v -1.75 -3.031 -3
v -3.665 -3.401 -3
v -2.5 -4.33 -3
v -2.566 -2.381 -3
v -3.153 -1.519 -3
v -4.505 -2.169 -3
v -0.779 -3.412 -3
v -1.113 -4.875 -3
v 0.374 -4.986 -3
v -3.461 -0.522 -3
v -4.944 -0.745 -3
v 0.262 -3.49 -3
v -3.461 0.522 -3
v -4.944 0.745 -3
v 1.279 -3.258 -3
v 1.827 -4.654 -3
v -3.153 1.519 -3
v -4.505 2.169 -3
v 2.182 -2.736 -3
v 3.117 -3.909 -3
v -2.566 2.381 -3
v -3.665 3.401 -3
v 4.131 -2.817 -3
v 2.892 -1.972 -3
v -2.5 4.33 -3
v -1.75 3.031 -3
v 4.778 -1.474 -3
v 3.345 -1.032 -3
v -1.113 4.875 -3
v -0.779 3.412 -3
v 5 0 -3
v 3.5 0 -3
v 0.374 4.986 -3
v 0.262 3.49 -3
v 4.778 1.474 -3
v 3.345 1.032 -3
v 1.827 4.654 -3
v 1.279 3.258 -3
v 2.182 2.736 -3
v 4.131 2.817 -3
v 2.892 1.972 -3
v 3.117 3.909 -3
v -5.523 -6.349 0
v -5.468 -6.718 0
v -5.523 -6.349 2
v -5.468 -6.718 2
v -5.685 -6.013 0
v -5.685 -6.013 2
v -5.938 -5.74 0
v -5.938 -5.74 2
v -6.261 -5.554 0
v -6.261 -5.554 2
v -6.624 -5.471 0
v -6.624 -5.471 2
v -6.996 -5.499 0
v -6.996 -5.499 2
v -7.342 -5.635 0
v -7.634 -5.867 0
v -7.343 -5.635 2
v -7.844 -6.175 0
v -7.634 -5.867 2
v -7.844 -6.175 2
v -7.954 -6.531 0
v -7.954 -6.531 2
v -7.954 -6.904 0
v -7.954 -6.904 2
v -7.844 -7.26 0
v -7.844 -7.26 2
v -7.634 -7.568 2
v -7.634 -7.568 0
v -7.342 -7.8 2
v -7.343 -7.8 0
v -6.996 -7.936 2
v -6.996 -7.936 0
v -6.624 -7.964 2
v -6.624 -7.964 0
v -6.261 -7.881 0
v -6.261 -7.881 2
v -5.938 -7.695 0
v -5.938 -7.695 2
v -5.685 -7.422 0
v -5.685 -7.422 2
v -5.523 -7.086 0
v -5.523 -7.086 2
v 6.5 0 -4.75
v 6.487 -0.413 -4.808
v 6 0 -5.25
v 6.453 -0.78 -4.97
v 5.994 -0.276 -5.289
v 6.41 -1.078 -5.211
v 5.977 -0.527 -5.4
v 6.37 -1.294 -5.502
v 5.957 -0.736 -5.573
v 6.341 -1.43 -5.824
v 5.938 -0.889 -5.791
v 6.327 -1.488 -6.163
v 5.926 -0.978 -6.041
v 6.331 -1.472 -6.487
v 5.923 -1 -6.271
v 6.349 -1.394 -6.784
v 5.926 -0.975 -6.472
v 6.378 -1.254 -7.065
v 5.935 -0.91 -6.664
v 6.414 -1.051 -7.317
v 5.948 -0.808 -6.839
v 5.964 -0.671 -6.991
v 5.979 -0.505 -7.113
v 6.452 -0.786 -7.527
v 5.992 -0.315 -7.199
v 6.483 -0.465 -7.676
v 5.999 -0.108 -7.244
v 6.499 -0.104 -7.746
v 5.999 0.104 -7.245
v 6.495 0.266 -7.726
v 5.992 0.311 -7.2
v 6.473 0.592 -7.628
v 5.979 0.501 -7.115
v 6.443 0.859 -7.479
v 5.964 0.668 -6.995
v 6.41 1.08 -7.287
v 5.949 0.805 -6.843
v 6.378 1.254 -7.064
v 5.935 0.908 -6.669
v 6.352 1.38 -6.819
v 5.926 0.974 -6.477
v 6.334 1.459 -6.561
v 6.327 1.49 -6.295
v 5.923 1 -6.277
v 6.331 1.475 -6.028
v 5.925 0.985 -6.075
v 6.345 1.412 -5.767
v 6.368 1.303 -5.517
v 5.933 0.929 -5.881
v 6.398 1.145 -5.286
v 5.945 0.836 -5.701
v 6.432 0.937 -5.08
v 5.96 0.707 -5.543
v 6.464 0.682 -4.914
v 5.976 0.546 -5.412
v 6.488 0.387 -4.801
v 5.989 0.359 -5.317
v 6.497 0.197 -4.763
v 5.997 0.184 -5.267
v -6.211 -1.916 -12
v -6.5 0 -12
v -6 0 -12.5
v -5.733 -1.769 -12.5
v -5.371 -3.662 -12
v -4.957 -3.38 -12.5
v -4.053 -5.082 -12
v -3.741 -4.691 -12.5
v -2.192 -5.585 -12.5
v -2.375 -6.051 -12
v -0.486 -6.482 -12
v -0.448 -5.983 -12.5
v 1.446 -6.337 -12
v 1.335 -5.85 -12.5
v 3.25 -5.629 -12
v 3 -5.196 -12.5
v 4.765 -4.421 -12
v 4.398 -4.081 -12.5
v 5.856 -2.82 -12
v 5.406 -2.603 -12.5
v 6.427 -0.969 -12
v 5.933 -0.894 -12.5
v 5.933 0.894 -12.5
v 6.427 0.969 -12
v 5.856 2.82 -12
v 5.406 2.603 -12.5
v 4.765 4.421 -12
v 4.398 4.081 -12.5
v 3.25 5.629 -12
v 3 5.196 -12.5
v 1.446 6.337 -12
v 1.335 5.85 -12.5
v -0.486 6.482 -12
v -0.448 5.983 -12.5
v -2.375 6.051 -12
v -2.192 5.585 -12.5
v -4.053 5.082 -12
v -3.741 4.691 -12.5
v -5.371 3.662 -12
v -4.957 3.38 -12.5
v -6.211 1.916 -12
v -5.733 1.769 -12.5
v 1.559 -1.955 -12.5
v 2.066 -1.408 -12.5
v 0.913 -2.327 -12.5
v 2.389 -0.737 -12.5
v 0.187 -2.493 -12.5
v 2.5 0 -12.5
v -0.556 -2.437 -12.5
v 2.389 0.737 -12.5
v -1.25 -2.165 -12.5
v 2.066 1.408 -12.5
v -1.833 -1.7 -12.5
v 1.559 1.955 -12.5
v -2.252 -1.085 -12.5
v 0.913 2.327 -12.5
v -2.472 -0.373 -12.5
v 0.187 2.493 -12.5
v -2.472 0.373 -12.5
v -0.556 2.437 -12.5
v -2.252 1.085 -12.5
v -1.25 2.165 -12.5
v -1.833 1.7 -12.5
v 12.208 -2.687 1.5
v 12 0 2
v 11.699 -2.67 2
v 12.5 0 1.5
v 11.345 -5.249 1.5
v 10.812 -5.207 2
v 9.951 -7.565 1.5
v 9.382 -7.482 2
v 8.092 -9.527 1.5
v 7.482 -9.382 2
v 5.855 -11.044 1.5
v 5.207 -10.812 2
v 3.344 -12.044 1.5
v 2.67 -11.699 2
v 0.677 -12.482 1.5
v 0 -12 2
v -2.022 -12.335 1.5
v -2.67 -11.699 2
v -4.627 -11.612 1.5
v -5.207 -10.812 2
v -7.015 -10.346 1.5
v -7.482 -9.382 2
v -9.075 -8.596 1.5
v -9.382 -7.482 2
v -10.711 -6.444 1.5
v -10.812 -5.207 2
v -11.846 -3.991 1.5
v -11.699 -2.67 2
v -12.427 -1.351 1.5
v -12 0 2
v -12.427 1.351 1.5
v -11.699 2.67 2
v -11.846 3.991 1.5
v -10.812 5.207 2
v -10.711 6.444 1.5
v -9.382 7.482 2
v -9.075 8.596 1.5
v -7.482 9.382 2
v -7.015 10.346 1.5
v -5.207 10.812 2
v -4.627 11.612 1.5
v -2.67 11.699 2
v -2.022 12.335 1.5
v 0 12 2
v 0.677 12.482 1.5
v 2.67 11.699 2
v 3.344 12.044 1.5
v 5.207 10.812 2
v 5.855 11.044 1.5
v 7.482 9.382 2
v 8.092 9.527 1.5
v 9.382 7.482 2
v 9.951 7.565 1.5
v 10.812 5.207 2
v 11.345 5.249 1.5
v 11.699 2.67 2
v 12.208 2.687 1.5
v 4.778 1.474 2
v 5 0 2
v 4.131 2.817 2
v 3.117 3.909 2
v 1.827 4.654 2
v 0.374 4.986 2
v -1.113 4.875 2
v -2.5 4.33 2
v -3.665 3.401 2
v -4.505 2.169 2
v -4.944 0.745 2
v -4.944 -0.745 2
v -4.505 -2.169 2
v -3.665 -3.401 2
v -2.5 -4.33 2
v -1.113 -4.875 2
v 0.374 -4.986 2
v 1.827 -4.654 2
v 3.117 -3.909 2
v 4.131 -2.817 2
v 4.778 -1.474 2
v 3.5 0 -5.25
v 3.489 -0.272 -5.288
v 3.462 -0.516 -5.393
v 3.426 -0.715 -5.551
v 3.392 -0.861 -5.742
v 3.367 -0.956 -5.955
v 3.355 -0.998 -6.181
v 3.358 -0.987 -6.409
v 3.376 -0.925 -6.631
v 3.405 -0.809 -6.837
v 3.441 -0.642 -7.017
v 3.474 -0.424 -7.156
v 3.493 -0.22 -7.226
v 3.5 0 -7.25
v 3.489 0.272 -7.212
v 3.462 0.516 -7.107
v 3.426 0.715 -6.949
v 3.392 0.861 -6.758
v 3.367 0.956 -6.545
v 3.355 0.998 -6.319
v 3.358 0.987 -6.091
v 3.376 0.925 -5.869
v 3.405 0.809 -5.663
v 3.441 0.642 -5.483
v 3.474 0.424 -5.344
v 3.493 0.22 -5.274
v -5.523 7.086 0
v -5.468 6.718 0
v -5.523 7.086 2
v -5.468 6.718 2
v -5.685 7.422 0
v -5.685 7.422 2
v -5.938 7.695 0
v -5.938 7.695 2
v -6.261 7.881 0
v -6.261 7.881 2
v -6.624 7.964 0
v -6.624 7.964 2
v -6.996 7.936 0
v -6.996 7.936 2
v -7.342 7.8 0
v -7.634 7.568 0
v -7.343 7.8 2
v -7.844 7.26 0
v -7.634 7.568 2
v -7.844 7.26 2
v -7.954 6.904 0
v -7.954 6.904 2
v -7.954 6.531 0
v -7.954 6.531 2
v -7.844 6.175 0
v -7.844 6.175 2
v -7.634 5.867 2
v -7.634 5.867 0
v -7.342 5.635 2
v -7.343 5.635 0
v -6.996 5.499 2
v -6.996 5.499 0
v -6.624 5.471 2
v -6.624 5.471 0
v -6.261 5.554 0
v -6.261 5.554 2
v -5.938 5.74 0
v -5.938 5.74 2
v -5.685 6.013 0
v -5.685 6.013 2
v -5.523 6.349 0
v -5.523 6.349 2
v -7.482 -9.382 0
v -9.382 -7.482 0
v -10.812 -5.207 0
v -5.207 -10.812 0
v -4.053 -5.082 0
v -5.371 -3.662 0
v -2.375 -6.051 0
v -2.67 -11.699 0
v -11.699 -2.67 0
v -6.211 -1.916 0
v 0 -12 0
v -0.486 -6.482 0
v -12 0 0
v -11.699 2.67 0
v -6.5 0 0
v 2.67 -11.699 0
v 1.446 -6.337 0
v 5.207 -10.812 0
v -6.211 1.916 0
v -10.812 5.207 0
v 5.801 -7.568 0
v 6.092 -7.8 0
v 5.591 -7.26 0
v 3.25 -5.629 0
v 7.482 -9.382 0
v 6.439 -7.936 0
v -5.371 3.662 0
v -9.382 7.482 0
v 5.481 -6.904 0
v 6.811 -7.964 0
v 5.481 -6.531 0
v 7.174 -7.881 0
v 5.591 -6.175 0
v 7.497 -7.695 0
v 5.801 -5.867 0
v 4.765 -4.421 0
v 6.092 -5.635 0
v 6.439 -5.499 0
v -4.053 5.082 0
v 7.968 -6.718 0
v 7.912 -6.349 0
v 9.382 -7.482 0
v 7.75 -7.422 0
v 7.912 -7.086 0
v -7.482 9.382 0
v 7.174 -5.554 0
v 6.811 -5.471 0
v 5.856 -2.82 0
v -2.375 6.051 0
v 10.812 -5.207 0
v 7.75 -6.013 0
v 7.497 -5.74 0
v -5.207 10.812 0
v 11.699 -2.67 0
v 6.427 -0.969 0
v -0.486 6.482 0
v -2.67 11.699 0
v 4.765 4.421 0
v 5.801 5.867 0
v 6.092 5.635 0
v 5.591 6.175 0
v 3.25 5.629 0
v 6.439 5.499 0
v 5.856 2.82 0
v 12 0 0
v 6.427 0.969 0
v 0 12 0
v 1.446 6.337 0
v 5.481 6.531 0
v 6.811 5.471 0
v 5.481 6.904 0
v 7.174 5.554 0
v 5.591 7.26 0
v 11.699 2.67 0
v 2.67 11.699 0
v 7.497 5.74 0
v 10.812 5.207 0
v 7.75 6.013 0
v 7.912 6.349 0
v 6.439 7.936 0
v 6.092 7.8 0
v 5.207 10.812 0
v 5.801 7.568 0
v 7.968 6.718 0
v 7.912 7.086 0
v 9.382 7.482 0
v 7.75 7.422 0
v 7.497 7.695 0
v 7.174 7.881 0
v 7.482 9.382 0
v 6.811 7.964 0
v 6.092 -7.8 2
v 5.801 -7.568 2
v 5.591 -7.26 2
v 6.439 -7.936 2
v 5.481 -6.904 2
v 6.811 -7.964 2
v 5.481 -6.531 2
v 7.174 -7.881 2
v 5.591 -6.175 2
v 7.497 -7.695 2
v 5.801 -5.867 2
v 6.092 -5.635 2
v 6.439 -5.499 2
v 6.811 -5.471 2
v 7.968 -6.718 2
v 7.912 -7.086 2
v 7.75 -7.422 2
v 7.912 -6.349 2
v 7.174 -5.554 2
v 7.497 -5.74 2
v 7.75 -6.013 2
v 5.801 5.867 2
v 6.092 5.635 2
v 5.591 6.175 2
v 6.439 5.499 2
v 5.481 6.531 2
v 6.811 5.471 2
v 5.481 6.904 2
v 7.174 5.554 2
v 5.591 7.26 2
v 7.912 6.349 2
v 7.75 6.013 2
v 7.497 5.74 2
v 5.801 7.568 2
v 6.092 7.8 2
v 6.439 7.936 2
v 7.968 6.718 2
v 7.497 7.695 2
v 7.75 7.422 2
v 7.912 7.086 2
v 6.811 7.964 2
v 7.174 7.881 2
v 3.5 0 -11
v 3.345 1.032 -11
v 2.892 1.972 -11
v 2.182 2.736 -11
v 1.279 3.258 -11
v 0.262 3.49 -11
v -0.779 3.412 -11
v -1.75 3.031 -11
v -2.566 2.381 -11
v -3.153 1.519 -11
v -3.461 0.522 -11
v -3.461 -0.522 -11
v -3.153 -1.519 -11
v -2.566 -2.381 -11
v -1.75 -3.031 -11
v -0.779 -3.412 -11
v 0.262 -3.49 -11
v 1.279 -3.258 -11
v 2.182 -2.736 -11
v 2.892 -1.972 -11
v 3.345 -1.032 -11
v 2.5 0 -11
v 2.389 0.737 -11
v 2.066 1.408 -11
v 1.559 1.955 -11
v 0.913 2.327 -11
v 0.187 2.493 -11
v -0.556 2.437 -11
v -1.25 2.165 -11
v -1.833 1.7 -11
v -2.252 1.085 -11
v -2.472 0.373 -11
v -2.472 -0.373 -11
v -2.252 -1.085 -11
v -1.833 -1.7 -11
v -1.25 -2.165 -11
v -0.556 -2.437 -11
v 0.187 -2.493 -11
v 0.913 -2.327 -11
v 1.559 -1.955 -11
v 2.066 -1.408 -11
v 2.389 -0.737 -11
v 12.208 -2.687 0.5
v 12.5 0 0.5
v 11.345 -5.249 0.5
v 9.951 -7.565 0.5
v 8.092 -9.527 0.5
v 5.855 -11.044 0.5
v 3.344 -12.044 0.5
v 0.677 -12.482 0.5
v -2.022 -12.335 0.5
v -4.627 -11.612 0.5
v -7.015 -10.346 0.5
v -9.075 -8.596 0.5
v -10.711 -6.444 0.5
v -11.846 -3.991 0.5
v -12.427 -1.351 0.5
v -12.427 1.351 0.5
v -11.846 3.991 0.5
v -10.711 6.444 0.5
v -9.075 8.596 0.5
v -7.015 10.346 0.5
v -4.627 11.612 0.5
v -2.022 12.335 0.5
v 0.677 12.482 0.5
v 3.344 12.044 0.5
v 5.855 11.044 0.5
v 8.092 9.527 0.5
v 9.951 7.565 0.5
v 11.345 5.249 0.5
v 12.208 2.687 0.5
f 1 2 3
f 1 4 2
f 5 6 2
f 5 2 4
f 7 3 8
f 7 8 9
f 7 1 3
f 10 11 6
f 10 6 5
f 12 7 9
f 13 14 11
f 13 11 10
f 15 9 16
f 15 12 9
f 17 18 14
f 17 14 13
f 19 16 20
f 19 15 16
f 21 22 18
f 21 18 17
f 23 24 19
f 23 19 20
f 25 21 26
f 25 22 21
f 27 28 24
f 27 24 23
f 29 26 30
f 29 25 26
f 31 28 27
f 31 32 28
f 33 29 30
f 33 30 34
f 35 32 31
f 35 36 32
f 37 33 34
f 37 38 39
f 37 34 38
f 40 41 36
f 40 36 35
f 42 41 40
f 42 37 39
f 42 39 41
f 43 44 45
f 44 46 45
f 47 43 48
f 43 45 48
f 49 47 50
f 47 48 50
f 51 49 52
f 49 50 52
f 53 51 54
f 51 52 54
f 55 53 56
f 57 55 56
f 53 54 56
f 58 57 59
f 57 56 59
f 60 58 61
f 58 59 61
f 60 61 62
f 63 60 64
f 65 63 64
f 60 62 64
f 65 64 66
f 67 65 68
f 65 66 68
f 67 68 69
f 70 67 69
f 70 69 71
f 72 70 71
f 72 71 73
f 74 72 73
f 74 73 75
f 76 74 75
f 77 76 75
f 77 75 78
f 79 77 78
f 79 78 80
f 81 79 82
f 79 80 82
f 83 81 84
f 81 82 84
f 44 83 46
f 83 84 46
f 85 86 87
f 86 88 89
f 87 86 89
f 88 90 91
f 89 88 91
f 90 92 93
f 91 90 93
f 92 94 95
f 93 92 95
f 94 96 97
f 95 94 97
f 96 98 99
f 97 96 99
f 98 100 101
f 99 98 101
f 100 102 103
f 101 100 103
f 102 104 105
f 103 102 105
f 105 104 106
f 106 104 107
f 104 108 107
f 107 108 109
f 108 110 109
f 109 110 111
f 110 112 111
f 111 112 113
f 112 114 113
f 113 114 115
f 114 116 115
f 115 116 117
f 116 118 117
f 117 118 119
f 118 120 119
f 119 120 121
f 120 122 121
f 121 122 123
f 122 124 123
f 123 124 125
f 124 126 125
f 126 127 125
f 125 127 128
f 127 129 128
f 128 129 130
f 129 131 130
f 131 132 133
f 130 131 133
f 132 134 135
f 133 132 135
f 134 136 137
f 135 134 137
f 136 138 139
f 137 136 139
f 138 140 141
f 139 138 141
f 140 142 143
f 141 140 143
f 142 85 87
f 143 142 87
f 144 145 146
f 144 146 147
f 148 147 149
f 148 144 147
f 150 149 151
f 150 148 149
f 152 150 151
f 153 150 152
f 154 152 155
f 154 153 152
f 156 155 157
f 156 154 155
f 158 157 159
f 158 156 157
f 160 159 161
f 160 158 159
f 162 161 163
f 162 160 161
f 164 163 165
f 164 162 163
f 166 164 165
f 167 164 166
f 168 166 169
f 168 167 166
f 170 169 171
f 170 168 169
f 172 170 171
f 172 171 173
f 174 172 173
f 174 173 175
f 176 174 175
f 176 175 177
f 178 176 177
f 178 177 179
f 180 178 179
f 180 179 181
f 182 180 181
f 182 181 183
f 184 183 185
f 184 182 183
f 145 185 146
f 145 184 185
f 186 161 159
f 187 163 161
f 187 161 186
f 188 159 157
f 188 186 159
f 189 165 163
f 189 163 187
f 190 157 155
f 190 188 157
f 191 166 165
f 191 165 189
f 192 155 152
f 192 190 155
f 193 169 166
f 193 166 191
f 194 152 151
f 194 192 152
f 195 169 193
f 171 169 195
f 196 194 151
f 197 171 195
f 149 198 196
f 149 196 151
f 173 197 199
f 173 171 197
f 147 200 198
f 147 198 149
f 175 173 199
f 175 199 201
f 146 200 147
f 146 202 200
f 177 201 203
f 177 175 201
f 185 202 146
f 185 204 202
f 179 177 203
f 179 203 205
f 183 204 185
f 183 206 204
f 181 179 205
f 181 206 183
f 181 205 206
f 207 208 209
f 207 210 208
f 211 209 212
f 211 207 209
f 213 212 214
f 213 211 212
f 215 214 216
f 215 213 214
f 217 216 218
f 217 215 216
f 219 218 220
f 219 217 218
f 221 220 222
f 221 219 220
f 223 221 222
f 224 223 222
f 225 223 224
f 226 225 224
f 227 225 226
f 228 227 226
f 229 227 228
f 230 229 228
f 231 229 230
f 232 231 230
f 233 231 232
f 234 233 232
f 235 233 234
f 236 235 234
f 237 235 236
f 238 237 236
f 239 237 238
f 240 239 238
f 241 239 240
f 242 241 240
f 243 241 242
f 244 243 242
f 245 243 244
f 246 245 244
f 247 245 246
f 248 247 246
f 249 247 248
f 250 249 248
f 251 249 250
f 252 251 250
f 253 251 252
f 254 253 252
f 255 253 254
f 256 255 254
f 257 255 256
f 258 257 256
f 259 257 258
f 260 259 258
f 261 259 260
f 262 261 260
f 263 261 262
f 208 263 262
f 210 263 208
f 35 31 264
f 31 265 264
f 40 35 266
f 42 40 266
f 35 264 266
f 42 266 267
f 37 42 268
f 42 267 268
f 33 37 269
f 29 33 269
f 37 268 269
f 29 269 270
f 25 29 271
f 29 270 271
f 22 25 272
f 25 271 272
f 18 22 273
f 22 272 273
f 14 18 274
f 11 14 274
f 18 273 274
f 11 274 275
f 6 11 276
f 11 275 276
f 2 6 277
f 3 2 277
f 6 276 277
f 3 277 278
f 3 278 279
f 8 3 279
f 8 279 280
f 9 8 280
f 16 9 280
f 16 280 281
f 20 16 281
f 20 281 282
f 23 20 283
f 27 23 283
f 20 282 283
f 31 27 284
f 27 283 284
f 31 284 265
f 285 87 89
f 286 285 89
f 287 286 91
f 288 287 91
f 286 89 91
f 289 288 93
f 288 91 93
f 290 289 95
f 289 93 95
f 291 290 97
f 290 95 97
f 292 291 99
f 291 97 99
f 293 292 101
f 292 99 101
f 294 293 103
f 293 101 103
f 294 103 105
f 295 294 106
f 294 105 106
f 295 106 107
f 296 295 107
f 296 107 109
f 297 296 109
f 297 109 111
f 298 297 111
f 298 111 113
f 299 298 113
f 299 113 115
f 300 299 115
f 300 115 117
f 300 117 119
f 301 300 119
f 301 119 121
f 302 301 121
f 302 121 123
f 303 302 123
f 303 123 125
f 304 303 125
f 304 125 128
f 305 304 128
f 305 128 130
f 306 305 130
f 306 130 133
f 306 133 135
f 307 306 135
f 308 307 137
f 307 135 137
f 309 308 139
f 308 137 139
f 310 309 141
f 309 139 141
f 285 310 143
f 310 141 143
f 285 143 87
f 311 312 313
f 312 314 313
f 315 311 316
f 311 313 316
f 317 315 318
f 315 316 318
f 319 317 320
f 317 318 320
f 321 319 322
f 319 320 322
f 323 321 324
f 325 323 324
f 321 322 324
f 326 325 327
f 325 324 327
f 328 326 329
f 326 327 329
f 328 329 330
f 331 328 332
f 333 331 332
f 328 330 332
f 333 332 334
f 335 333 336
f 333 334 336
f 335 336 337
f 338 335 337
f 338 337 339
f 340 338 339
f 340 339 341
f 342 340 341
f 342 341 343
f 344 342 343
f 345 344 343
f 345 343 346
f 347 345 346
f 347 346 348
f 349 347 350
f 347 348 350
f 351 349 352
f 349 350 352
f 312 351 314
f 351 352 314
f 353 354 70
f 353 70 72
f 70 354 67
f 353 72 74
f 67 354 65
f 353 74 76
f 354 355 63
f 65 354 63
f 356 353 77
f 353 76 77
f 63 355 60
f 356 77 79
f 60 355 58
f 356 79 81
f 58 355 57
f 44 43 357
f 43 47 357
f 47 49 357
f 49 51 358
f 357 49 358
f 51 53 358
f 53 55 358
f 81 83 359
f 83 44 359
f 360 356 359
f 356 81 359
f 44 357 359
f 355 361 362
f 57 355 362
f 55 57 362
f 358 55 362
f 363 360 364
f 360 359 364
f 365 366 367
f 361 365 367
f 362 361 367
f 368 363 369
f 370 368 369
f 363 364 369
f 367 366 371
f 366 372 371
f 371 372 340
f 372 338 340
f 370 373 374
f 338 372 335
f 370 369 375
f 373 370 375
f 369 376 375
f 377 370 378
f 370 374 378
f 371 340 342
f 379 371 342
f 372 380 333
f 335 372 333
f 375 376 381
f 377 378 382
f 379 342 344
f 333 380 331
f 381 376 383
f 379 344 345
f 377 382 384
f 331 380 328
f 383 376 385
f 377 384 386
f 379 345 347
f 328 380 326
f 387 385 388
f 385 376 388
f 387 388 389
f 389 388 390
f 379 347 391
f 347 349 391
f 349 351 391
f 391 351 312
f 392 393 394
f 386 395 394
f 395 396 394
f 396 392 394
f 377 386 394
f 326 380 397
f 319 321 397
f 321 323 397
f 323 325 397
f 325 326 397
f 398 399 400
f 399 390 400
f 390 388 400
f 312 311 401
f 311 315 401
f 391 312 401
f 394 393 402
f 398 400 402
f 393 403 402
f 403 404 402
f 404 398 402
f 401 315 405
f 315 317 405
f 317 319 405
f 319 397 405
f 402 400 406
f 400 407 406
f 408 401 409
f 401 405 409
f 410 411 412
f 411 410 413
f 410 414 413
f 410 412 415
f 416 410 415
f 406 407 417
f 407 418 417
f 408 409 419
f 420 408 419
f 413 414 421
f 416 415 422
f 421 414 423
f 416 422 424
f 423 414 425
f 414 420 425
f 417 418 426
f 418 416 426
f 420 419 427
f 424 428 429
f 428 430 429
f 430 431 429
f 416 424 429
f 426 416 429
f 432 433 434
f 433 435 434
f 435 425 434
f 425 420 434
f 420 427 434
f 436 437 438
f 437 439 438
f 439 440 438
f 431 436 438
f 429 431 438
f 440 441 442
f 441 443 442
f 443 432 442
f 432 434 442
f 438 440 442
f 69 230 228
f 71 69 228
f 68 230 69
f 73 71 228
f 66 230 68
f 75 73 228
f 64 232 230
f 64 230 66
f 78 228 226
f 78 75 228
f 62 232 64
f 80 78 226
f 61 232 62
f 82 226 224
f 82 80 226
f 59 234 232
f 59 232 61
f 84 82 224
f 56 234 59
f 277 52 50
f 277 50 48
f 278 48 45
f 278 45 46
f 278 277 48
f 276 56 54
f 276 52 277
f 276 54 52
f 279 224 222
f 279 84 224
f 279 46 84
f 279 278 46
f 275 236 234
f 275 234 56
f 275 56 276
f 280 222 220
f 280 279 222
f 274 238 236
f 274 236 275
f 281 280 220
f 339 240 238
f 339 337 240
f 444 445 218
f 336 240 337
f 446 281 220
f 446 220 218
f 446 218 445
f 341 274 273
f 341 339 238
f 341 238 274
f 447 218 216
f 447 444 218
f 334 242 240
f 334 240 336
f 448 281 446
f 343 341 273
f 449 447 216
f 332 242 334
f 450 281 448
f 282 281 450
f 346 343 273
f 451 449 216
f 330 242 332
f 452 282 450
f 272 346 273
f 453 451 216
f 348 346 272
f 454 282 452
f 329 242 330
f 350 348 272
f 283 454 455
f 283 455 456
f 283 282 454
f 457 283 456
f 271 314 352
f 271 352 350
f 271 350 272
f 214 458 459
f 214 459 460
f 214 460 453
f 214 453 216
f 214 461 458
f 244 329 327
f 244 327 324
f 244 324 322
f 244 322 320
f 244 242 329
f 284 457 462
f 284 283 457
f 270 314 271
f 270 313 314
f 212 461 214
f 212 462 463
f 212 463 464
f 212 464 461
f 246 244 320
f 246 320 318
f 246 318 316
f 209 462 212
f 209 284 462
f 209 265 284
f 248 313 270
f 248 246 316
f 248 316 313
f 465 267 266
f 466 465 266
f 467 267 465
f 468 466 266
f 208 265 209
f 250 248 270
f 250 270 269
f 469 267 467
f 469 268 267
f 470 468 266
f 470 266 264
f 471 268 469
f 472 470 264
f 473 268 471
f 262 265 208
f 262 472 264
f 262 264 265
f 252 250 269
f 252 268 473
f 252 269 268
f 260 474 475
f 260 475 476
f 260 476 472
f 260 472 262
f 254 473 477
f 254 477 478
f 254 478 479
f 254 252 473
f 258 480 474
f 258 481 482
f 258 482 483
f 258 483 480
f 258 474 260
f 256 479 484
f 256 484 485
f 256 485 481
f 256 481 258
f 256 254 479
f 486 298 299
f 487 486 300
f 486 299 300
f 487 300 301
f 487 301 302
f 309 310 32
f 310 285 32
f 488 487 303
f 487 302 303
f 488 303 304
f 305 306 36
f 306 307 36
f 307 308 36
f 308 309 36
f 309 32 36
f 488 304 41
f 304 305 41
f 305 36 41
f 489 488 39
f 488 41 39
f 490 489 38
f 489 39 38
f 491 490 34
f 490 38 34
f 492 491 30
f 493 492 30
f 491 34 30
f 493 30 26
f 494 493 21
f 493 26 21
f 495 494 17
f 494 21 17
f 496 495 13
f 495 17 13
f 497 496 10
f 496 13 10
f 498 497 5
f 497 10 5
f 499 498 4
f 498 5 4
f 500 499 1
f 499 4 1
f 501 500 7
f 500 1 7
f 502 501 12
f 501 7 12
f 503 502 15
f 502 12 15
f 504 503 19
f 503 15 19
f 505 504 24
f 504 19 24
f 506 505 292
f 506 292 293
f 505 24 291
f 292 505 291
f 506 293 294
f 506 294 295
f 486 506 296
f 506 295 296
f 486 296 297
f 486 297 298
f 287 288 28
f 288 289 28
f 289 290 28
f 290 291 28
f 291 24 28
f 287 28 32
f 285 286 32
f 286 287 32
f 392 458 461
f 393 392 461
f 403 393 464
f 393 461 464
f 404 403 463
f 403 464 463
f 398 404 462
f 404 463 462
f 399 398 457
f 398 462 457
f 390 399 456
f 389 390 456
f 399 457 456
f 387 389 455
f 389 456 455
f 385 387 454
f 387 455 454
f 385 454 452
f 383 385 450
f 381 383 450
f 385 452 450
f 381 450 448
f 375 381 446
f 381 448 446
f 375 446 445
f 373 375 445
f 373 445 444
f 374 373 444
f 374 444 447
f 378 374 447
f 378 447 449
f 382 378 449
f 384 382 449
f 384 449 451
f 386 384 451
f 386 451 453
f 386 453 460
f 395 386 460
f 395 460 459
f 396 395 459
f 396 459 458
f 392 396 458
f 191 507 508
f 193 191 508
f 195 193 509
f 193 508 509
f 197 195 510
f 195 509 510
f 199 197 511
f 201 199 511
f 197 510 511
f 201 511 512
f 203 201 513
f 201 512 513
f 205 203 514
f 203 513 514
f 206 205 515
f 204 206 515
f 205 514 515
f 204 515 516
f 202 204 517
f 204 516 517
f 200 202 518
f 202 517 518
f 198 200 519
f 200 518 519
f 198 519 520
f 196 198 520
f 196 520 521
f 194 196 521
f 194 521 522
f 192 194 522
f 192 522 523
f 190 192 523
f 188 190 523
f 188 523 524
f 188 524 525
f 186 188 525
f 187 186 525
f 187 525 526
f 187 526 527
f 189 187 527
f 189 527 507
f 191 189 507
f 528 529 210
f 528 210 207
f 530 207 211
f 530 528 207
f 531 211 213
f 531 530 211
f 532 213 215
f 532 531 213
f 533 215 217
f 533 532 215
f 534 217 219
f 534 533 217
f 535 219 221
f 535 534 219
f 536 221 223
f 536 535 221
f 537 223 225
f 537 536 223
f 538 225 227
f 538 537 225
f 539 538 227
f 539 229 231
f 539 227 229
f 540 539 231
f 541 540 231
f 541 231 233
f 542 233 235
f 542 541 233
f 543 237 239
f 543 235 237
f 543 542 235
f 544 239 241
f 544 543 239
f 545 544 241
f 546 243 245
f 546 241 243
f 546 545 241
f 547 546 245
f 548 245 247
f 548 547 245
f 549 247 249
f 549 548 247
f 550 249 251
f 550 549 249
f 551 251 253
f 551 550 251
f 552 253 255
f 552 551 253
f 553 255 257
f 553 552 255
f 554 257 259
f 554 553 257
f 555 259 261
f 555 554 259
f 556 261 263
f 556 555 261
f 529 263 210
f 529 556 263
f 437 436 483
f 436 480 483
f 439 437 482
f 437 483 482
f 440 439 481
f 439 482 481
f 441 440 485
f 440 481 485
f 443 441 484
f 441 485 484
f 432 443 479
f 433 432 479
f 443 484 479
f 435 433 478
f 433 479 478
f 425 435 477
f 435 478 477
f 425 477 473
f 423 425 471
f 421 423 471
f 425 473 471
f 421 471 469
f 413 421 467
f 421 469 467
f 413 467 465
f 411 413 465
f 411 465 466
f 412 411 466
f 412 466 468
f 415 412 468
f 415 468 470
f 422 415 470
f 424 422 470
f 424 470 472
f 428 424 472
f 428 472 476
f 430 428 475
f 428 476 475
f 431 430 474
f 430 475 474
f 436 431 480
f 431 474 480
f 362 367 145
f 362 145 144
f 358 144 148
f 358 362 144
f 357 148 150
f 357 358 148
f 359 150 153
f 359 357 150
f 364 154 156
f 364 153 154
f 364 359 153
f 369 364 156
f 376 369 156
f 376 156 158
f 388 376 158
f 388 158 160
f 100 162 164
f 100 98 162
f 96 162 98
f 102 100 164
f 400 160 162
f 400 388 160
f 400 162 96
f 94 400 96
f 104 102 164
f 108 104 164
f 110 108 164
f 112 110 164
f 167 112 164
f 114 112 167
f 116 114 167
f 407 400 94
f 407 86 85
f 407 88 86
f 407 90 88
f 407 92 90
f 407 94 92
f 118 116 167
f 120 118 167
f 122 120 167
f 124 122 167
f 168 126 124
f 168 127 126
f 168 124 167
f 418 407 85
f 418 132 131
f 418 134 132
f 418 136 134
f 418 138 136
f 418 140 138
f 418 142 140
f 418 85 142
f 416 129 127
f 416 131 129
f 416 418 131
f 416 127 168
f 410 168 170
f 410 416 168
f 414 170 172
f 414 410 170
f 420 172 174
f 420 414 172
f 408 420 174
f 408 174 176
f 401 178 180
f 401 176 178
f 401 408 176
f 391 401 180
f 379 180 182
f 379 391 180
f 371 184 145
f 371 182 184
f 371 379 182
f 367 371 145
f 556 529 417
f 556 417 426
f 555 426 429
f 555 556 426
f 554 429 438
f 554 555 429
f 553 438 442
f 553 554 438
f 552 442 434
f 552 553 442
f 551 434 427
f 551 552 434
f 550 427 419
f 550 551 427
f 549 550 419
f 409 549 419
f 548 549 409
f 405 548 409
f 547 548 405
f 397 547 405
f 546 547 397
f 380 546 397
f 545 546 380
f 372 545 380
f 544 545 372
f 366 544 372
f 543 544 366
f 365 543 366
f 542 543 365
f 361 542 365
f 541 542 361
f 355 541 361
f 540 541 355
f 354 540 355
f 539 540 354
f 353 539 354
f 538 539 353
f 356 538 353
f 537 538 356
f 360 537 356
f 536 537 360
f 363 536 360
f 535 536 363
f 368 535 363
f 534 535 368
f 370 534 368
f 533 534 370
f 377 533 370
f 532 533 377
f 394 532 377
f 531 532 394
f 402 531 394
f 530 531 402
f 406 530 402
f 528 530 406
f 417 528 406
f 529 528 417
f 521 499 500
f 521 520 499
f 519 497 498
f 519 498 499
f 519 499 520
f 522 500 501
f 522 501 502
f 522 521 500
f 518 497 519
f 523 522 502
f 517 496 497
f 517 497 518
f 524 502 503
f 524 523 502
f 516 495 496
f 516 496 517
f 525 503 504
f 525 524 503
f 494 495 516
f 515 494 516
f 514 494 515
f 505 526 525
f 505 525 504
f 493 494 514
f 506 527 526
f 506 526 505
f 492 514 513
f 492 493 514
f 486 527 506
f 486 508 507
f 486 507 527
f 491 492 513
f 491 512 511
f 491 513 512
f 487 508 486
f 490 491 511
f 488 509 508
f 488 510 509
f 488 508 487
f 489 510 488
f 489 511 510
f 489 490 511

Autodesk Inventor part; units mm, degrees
ref_plane "YZ Plane" through (0, 0, 0) normal (1, 0, 0) x (0, 1, 0)
ref_plane "XZ Plane" through (0, 0, 0) normal (0, 1, 0) x (-1, 0, 0)
ref_plane "XY Plane" through (0, 0, 0) normal (0, 0, 1) x (1, 0, 0)
sketch "Sketch1" plane through (0, 0, 0) normal (0, 0, 1) x (1, 0, 0)
  circle A0 centre (0, 0) radius 12.5
  dimension "d0" = 25
extrude "Extrusion1" add sketch "Sketch1" along normal blind 2
sketch "Sketch2" plane through (0, 0, 0) normal (0, 0, -1) x (-1, 0, 0)
  circle A0 centre (0, 0) radius 12.5 projected
  circle A1 centre (0, 0) radius 6.5
  dimension "d3" = 13
extrude "Extrusion2" add sketch "Sketch2" along normal blind 12.5 contours A1
sketch "Sketch3" plane through (0, 0, 2) normal (0, 0, 1) x (1, 0, 0)
  circle A0 centre (0, 0) radius 12.5 projected
  circle A1 centre (0, 0) radius 5
  dimension "d6" = 10
extrude "Extrusion3" cut sketch "Sketch3" against normal blind 5 contours A1
sketch "Sketch4" plane through (0, 0, -3) normal (0, 0, 1) x (1, 0, 0)
  circle A0 centre (0, 0) radius 5 projected
  circle A1 centre (0, 0) radius 3.5
  dimension "d9" = 7
extrude "Extrusion4" cut sketch "Sketch4" against normal blind 8 contours A1
sketch "Sketch5" plane through (0, 0, -11) normal (0, 0, 1) x (1, 0, 0)
  circle A0 centre (0, 0) radius 3.5 projected
  circle A1 centre (0, 0) radius 2.5
  dimension "d12" = 5
extrude "Extrusion5" cut sketch "Sketch5" against normal through all contours A1
sketch "Sketch6" plane through (0, 0, 0) normal (1, 0, 0) x (0, 1, 0)
  line L0 (-6.5, -12.5) -> (6.5, -12.5) projected
  line L1 (6.5, 0) -> (-6.5, 0) projected
  line L2 (6.5, 0) -> (6.5, -12.5) projected
  line L3 (-6.5, 0) -> (-6.5, -12.5) projected
  point P0 (0, 0)
  point P1 (0, -6.25)
hole "Hole1" at (0, 0, -6.25) direction (1, 0, 0) diameter 2 end through all
chamfer "Chamfer1" distance 0.5 angle 45 4 edges at (-12.5, 0, 2) (-12.5, 0, 0) (6.5, 0, -12.5) (6.5, 0.0019, -7.25)
sketch "Sketch7" plane through (0, 0, 2) normal (0, 0, 1) x (1, 0, 0)
  circle A0 centre (0, 0) radius 12 projected
  circle A1 centre (0, 0) radius 9.5
  circle A2 centre (0, 0) radius 3.5 construction
  line L0 (0, 0) -> (12, 0) construction
  circle A3 centre (0, 0) radius 2.5 construction
  line L1 (0, 0) -> (6.7175, 6.7175) construction
  circle A4 centre (6.7175, 6.7175) radius 1.25
  circle A5 centre (6.7175, -6.7175) radius 1.25
  circle A6 centre (-6.7175, -6.7175) radius 1.25
  circle A7 centre (-6.7175, 6.7175) radius 1.25
  point P0 (0, 9.5)
  point P1 (0, -9.5)
  point P2 (-9.5, 0)
  point P3 (9.5, 0)
  dimension "d25" = 19
  dimension "d26" = 45
  dimension "d29" = 360
  dimension "d31" = 2.5
  dimension "d32" = 2.5
  dimension "d33" = 2.5
  dimension "d34" = 2.5
extrude "Extrusion6" cut sketch "Sketch7" against normal through all contours A4 A1 | A1 A4 | A5 A1 | A1 A5 | A7 A1 | A1 A7 | A6 A1 | A1 A6
properties part number "22 - Valve Disc Hub" material "Steel AISI 1020 108 ANLD"
